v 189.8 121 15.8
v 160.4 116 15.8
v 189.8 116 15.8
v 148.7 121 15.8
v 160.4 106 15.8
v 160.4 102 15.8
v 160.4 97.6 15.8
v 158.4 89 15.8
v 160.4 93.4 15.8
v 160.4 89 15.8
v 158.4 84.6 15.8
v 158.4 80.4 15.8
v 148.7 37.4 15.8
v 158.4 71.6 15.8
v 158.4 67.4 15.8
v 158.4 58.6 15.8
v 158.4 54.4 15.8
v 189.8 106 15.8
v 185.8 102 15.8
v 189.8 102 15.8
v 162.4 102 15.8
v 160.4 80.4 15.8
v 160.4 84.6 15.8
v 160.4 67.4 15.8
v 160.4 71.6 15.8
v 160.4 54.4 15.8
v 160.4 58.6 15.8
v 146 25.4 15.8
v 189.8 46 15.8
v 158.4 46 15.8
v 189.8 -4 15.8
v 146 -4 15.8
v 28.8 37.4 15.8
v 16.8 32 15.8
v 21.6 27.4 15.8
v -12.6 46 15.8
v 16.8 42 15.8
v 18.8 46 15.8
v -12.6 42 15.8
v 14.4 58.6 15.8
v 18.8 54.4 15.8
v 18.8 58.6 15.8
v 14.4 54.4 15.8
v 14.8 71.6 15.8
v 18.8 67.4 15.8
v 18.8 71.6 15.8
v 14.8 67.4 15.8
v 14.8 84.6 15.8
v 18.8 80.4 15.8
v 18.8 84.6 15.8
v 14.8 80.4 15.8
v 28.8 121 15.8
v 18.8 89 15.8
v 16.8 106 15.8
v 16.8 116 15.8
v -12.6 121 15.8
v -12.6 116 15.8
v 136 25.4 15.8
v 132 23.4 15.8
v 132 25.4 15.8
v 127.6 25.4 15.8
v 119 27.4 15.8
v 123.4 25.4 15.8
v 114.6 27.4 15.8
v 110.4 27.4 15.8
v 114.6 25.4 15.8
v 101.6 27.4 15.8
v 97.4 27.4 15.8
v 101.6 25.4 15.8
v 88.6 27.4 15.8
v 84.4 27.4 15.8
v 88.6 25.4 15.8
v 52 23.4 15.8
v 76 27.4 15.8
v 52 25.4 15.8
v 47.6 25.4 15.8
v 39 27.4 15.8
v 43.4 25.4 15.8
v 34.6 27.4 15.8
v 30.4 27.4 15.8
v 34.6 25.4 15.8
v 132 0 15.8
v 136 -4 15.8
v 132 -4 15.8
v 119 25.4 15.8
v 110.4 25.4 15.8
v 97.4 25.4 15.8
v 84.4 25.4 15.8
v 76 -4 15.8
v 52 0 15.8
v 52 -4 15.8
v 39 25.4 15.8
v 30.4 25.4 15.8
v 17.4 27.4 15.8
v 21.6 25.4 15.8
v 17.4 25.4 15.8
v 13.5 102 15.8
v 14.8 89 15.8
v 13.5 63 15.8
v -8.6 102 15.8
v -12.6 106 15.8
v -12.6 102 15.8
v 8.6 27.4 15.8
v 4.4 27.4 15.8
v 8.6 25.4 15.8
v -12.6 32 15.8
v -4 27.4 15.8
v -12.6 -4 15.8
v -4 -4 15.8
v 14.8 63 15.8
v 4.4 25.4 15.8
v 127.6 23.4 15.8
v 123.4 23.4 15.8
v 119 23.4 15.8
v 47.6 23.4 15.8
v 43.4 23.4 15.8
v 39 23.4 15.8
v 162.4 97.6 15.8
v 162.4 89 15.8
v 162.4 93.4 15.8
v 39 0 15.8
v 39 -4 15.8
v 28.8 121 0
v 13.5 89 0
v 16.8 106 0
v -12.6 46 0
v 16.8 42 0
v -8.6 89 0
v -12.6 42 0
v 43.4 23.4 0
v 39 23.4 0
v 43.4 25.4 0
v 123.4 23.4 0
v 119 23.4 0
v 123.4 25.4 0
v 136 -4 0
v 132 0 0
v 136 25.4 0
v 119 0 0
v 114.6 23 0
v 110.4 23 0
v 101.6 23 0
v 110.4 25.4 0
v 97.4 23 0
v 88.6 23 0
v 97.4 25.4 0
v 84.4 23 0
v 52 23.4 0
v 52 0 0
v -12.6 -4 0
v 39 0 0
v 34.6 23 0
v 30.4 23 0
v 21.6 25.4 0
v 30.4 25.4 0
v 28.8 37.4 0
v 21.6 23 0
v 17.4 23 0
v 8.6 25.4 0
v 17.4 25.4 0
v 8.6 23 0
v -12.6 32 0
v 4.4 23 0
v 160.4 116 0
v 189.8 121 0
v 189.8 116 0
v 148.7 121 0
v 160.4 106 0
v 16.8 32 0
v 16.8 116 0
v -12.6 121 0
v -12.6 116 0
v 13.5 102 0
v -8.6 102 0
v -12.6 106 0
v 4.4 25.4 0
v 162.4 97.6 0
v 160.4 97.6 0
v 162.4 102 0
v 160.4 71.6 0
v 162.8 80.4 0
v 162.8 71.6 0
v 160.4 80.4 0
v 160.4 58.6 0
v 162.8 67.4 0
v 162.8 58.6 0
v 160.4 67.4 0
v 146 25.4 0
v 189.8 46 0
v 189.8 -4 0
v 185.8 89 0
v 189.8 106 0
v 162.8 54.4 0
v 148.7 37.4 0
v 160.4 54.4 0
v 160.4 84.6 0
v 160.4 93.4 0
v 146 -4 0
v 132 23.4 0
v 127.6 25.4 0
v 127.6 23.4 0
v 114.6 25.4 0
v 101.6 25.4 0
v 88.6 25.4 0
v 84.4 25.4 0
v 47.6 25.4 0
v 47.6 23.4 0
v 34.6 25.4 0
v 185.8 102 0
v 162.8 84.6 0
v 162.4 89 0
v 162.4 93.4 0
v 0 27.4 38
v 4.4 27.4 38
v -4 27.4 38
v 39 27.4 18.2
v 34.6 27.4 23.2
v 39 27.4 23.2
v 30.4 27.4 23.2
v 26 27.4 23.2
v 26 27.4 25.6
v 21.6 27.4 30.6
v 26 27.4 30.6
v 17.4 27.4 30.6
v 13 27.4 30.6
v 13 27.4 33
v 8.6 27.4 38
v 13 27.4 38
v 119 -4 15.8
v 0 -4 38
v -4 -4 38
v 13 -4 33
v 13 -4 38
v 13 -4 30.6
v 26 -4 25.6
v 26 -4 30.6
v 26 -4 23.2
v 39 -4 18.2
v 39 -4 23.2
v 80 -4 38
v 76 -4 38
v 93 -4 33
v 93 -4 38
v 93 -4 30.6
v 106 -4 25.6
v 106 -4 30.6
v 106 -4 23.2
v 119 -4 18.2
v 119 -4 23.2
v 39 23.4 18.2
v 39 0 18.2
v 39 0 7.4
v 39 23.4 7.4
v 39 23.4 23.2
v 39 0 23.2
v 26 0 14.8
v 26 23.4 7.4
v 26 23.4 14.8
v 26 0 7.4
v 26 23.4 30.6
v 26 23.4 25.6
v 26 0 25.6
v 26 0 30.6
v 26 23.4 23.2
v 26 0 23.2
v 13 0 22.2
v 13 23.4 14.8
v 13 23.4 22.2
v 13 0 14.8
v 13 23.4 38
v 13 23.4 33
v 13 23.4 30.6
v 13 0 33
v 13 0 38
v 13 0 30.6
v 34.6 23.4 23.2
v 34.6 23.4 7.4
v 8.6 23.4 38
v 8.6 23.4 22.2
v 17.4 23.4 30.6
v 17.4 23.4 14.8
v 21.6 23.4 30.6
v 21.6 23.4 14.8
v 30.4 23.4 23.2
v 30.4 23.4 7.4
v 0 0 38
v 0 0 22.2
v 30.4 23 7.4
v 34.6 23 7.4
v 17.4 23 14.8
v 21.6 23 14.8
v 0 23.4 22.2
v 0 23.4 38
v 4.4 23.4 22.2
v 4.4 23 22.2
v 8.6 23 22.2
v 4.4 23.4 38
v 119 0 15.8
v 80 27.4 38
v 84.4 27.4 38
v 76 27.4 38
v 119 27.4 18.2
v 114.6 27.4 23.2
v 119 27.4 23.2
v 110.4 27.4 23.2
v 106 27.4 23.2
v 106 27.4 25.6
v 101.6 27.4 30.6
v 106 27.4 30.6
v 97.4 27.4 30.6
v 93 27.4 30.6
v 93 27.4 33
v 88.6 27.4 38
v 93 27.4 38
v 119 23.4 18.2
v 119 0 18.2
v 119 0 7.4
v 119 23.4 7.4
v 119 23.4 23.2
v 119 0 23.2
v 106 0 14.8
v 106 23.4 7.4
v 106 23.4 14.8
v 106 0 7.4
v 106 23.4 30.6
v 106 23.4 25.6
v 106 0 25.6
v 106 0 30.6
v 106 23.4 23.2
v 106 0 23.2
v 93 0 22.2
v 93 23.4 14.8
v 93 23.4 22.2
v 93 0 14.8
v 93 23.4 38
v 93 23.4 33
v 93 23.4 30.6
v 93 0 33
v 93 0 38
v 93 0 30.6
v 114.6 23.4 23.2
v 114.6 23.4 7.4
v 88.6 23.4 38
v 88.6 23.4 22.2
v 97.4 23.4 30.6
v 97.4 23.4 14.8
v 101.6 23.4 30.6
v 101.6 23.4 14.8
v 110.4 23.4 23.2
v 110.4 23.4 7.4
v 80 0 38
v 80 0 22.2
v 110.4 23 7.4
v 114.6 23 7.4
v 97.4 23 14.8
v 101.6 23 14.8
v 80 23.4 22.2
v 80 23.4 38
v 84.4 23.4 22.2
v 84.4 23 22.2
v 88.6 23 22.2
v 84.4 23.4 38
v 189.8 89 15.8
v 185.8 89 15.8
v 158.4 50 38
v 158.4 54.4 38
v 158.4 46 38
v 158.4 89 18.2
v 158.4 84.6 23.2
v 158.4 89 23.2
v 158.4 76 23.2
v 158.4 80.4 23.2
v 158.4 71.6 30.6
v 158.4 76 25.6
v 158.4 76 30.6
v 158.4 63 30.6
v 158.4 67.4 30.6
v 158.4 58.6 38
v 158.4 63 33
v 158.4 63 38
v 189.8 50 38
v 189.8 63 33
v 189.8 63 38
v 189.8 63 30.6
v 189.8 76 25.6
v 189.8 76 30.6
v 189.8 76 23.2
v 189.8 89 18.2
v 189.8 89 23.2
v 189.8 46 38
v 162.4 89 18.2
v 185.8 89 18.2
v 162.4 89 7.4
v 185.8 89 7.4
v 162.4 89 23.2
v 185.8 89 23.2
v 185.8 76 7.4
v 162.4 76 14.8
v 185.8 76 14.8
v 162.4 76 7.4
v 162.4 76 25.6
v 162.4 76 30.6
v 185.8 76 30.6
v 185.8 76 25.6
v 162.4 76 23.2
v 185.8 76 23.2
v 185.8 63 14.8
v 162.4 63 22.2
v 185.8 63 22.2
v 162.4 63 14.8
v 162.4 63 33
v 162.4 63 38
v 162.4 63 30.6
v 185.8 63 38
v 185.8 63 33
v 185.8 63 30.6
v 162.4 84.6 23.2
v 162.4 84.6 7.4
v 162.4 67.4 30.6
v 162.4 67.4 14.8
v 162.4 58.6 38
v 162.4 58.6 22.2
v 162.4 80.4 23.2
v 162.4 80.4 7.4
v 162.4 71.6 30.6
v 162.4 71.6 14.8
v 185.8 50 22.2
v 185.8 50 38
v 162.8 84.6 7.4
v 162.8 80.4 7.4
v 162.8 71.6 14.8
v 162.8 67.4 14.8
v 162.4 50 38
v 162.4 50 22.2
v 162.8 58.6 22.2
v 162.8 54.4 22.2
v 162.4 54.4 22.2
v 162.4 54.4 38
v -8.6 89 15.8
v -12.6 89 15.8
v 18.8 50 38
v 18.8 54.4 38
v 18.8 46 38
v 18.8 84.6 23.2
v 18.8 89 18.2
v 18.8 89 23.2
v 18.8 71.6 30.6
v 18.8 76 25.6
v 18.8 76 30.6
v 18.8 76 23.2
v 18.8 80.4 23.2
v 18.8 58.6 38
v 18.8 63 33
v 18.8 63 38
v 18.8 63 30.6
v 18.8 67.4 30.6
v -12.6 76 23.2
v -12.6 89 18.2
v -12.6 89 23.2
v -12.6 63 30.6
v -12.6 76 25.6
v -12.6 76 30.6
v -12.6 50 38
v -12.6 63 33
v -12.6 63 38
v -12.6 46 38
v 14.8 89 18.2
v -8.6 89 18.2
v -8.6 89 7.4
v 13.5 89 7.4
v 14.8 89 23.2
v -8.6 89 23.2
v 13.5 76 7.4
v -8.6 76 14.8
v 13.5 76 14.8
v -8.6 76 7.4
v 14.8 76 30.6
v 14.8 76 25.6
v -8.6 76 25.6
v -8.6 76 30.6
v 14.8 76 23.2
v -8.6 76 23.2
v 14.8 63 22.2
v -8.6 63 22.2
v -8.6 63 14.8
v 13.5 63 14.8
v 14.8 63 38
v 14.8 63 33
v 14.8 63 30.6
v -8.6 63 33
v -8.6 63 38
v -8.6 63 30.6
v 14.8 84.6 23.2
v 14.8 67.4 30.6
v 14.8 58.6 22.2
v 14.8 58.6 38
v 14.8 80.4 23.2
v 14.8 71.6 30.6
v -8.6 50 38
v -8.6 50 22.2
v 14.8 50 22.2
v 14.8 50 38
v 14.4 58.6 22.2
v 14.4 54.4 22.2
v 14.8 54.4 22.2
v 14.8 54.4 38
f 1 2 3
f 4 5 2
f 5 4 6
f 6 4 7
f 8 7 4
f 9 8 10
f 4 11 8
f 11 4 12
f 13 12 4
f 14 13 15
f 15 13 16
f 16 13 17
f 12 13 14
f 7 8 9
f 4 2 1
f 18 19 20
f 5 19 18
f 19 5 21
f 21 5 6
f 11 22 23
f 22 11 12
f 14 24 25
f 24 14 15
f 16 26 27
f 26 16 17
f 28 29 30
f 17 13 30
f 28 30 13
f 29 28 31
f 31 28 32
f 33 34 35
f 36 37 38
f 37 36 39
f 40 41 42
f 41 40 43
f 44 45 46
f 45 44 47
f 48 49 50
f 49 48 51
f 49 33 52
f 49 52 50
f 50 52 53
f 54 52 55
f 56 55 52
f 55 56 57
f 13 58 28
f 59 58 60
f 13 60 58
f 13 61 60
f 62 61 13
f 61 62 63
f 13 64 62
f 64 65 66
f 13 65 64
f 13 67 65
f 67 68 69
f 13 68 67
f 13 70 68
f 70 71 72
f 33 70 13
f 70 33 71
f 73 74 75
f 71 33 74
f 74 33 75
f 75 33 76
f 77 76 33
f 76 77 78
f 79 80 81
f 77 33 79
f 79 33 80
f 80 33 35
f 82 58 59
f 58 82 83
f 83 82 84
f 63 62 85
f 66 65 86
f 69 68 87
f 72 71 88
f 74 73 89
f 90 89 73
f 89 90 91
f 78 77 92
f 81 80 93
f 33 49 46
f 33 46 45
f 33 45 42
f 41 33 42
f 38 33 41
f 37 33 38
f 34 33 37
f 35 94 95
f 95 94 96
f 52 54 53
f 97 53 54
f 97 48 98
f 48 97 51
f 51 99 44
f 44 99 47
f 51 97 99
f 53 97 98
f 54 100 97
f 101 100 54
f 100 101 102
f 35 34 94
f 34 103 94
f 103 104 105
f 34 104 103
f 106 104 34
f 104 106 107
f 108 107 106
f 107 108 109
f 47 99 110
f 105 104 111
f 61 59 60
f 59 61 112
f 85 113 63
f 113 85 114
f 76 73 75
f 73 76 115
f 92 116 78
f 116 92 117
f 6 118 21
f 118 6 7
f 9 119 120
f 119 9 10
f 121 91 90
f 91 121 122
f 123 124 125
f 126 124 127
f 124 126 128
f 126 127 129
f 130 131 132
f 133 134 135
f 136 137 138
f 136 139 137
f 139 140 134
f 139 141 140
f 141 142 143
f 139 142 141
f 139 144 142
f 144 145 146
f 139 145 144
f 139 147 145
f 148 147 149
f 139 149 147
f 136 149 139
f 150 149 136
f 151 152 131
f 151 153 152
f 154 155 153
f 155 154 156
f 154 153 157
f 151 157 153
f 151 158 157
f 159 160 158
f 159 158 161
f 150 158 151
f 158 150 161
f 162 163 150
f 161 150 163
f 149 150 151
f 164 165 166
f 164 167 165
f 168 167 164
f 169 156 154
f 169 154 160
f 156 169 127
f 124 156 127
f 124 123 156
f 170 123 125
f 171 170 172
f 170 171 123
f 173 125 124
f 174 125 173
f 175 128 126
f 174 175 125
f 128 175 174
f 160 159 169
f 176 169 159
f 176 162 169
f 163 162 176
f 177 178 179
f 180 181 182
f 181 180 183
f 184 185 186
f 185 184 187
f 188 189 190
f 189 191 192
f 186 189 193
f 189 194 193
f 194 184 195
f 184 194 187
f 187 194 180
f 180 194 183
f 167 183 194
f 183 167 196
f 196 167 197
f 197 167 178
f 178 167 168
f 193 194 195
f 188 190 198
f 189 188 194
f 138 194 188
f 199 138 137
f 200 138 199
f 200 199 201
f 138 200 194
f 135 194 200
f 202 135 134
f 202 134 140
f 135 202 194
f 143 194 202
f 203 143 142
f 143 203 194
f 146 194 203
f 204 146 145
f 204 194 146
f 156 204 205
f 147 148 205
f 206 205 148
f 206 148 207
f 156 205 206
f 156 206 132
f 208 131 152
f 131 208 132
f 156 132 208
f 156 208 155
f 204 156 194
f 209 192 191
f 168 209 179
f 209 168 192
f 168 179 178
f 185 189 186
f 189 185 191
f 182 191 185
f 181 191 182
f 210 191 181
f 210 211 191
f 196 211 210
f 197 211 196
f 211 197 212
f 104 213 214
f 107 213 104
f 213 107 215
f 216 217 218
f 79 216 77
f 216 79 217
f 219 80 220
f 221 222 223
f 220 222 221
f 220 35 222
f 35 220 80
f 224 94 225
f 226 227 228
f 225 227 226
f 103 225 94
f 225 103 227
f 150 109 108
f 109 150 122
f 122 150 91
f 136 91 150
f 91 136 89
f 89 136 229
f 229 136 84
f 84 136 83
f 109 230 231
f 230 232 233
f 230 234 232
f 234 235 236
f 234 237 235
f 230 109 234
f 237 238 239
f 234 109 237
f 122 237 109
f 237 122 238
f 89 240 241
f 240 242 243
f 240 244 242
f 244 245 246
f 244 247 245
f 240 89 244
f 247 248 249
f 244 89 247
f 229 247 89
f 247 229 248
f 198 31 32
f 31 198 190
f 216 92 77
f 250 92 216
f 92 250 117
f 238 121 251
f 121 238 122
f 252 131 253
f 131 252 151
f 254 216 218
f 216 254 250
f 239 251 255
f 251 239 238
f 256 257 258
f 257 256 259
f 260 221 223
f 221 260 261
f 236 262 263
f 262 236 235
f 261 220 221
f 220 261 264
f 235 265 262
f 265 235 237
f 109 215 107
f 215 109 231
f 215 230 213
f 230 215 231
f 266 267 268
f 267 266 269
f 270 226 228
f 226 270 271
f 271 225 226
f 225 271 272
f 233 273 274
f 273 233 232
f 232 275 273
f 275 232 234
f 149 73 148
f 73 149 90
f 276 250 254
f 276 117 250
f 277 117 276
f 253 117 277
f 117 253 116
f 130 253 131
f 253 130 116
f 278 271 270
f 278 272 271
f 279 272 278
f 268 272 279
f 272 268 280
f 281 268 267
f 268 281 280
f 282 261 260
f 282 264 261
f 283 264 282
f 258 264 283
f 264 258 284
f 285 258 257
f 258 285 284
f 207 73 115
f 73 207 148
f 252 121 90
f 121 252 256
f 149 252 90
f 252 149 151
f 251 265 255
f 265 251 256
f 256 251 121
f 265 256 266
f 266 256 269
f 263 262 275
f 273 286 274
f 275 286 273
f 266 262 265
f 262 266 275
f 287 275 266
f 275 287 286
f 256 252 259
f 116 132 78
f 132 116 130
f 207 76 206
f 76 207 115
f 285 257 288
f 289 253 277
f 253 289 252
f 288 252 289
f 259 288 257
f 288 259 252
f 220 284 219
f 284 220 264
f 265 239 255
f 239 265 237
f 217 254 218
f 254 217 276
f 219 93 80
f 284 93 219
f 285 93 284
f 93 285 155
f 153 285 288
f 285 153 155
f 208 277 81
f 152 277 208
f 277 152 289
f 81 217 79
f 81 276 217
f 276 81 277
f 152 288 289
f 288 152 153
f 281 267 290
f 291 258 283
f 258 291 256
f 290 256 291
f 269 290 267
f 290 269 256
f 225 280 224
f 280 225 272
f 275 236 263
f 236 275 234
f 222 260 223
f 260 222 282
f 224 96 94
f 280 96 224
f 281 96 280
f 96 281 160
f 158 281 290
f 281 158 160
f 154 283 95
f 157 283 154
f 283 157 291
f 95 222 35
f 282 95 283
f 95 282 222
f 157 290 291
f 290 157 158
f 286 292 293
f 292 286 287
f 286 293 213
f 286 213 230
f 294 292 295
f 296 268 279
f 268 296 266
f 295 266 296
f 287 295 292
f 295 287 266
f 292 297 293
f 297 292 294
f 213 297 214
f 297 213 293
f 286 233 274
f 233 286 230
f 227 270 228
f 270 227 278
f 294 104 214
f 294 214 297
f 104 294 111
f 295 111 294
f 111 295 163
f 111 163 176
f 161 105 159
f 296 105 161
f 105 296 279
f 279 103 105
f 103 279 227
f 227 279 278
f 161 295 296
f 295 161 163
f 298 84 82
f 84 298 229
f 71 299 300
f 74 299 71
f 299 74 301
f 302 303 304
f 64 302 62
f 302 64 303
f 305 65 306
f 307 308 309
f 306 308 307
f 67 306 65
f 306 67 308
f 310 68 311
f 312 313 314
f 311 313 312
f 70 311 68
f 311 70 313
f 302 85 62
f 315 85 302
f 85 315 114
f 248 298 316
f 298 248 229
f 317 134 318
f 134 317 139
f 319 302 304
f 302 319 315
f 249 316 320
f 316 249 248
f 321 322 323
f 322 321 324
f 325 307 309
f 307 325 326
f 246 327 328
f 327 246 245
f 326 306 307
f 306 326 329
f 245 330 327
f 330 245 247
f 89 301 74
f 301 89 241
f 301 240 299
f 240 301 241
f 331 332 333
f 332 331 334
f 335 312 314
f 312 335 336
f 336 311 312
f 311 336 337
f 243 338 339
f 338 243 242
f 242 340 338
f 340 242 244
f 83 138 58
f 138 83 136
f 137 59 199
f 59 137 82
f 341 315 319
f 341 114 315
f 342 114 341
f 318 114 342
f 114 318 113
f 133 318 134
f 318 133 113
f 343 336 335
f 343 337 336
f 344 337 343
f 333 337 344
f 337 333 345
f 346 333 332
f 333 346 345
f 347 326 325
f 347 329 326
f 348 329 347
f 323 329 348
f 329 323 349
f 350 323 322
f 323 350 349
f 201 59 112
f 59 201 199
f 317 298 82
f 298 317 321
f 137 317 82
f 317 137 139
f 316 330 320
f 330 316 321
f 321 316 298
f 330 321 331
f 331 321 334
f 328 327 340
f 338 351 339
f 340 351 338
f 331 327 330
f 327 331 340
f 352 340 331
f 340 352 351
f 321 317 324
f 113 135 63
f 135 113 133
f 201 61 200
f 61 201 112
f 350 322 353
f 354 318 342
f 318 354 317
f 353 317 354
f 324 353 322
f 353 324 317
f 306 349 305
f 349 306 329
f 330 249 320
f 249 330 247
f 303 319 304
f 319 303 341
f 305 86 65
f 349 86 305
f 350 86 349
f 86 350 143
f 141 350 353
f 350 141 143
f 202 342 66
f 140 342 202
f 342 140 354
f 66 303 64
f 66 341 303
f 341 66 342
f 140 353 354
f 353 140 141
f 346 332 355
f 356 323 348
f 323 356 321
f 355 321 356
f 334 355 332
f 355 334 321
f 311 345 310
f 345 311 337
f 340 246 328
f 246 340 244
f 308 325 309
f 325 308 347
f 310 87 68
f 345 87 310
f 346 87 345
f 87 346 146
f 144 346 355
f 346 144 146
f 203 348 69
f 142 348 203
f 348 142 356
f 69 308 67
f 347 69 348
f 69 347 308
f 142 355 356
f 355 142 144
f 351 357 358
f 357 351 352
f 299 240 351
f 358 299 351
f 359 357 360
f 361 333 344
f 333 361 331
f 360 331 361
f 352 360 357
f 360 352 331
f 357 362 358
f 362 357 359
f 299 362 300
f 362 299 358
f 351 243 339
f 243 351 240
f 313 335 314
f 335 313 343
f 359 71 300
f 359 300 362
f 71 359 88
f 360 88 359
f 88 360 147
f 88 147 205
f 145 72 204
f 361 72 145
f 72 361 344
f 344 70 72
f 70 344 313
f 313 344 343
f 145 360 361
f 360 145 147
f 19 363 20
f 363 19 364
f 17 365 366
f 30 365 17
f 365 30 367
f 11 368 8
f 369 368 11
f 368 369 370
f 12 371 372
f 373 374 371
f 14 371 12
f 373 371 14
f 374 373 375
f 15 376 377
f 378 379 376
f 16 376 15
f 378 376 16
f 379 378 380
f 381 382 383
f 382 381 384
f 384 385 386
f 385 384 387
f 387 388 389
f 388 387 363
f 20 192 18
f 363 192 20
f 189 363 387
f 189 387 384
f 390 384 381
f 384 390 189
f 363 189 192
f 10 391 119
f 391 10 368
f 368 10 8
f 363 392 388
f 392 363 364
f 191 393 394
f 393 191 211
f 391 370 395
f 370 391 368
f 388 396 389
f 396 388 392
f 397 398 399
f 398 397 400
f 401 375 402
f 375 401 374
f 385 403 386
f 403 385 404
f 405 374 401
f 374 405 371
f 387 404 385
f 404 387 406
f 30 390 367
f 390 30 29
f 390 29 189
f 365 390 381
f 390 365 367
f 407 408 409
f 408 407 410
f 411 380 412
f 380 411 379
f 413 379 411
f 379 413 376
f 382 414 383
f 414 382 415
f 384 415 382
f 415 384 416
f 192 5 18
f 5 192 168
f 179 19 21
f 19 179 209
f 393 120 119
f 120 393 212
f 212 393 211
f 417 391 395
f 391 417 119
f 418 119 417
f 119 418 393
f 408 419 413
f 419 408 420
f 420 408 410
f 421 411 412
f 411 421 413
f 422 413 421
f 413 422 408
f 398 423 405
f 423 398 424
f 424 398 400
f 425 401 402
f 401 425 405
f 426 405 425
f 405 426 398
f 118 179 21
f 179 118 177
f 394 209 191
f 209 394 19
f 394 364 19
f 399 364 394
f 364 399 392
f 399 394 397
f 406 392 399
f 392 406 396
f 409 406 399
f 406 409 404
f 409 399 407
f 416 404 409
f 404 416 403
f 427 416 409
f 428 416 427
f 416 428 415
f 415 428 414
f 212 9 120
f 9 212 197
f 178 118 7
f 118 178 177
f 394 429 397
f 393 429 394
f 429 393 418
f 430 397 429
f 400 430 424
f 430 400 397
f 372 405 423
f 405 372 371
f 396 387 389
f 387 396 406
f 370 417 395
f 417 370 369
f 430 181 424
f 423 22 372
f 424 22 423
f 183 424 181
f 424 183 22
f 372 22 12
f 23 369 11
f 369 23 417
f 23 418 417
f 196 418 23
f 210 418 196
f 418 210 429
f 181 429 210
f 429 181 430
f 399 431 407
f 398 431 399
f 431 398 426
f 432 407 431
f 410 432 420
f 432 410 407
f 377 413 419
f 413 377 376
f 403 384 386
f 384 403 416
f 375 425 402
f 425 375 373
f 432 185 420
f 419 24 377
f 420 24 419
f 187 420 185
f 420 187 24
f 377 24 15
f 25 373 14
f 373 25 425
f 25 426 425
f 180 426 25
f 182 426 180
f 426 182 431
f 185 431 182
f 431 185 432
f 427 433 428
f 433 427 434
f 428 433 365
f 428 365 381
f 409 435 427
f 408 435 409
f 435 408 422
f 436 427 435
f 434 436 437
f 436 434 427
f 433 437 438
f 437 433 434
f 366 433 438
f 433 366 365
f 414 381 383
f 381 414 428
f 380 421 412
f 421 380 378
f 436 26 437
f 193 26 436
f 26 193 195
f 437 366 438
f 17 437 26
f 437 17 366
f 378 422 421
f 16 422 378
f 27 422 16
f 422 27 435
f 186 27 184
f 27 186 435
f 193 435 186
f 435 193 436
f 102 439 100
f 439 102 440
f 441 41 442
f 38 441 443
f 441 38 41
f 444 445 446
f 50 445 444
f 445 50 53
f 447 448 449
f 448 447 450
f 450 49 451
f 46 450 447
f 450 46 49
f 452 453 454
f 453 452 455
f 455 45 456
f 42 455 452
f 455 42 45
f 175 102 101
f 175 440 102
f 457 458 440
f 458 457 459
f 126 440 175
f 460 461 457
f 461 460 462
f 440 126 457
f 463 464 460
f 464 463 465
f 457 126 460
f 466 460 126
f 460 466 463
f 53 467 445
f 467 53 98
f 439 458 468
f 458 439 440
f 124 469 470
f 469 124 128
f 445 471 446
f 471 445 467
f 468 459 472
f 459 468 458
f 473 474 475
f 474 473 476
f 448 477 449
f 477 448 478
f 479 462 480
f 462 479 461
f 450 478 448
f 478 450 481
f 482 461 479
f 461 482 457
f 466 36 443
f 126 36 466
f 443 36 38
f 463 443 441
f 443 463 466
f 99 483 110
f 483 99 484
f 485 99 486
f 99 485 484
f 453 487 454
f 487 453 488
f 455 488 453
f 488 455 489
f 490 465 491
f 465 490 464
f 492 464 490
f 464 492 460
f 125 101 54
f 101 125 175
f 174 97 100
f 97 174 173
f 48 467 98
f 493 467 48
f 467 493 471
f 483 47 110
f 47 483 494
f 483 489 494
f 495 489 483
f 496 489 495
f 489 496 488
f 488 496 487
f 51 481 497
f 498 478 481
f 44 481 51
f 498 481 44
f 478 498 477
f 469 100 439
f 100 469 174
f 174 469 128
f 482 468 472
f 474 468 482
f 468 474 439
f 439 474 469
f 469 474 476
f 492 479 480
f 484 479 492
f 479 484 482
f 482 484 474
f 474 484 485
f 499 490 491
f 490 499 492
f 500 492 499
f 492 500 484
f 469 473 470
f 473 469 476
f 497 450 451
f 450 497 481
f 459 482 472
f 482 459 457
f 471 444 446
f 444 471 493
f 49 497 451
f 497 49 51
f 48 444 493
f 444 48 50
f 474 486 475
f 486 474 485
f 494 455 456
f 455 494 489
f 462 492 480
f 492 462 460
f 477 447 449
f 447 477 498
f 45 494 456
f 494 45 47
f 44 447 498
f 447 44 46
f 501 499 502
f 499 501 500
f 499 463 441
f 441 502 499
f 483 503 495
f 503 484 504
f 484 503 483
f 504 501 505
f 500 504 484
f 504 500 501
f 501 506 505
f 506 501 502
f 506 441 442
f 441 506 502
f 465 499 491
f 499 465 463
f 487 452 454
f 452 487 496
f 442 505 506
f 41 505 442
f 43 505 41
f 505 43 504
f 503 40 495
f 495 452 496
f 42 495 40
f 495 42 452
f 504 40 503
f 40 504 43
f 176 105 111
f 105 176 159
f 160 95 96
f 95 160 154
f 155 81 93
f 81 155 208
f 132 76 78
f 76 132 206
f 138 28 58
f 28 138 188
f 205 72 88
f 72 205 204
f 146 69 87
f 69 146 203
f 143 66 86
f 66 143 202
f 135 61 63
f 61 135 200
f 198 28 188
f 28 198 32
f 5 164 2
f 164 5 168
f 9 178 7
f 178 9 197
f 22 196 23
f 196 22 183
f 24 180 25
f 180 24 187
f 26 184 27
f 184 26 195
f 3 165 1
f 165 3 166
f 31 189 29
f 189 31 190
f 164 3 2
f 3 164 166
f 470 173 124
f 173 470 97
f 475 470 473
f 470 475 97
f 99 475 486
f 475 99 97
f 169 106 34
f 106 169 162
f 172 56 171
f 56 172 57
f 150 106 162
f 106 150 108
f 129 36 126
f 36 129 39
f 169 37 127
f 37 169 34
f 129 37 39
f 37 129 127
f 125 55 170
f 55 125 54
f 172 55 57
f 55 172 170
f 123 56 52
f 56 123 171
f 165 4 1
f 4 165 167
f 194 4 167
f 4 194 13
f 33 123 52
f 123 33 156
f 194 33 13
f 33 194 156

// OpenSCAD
// file: line.scad
//cube([100,100,15.8]);

servoW=12.6+0.4;
servoH=23.0+0.4;
    waku=4;

module servo(){
    cube([12.6+0.4,23.0+0.4,26.7]);
    translate([0,(23.0-32.4)/2,15.8])
    cube([12.6+0.4,32.4,2.4]);
    translate([(13-4.2)/2,23,-100])
    cube([4.2,5,18+100]);
}

module servos(num){
translate([servoW*4,0,0])
scale([-1,1,1])
    for(i = [0:num-1]){
        translate([i*13,0,(2.4+5)*i]){
            servo();
        }
    }
}

/**
* @deprecated
*/
module servo4_0(){
    servos(4);
}


module servoHolder(num){
translate([servoW*4,0,0])
scale([-1,1,1])
difference(){
union(){
    translate([-waku,-waku,0])
    cube([waku,waku*2+servoH,15.8]);
    translate([0,-waku,0]){
    for(i = [0:num-1]){
        translate([i*13,0,0]){
            cube([waku+servoW,waku*2+servoH,15.8+(2.4+5)*i]);
        }
    }
    }
}


union(){
    for(i = [0:num-1]){
        translate([i*13,0,(2.4+5)*i]){
            servo();
        }
    }
    
}
}
}

/**
*@deprecated
*/
module servo4(){
    servoHolder(4);
}

module servoRect(num, l=0){
    translate([-waku,-waku,0])
    cube([l==0?servoW*num+waku*2:l,servoH+waku+2,15.8]);
}

/**
* @deprecated
*/
module servo4_rect(l){
    servoRect(4, l);
}

module hikkake(l=servoW*4,d=10,fixPos=true,haba=1,thin=2,num=4){
    x=0;
    if(fixPos){
        x=-waku;
    }
    for(i=[1:1+num]){
        translate([0,-d,(2.4+5)*i+15.8+2.4-thin])
            cube([l,d,thin]);  
        translate([0,-d,(2.4+5)*i+15.8+2.4+haba])
            cube([l,d,thin]);  
    }

}

//servo4_0();
//servo();
//hikkake();
//

//for(i=[0:4]){
//translate([-waku,waku+servoH,(2.4+5)*i+15.8+2.4])
//cube([servoW*4,10,2]);
//}
//translate([-waku,waku+servoH,(2.4+5)+15.8+2.4])
//cube([servoW*2+waku,10,2]);
//translate([-waku,waku+servoH,(2.4+5)*2+15.8+2.4])
//cube([servoW+waku,10,2]);
//
//translate([100,0,0])
//servo4_rect();
//
//translate([0,50,0])
//servo4_rect();
// main file
include<line.scad>

difference(){
union(){

    //bottom
    servoHolder(4);
    translate([80.0,0,0])
    servoHolder(4);

    translate([185.8,50,0])
    rotate([0,0,90])
    servoHolder(4);

    translate([-8.6,50,0])
    rotate([0,0,-90])
    scale([-1,1,1])
    servoHolder(4);

    difference(){
        translate([-waku-8.6,-waku,0])
        cube([194.4+waku*2,120+5,15.8]);
        
        union(){
            servoRect(4);
            translate([80.0,0,0])
            servoRect(4);
            
            translate([140,0,0])
            servo4_rect(10);

            translate([185.8 ,50,0])
            rotate([0,0,90])
            servoRect(4);

            translate([185.8 ,110,0])
            rotate([0,0,90])
            servoRect(l=10);

            translate([-11.9,50,0])
            rotate([0,0,-90])
            scale([-1,1,1])
            servoRect(4);
            
            translate([-8.6,40-waku,0])
            rotate([0,0,-90])
            scale([-1,1,1])
            servoRect(l=10);
            
            translate([-8.6,110,0])
            rotate([0,0,-90])
            scale([-1,1,1])
            servoRect(l=10);
            
        }
    }
}
translate([-8.6+servoH+waku+10,servoH+waku+10,0])
cube([8.9+185.8 - servoH*2 - waku*2-20,100,100]);
}
